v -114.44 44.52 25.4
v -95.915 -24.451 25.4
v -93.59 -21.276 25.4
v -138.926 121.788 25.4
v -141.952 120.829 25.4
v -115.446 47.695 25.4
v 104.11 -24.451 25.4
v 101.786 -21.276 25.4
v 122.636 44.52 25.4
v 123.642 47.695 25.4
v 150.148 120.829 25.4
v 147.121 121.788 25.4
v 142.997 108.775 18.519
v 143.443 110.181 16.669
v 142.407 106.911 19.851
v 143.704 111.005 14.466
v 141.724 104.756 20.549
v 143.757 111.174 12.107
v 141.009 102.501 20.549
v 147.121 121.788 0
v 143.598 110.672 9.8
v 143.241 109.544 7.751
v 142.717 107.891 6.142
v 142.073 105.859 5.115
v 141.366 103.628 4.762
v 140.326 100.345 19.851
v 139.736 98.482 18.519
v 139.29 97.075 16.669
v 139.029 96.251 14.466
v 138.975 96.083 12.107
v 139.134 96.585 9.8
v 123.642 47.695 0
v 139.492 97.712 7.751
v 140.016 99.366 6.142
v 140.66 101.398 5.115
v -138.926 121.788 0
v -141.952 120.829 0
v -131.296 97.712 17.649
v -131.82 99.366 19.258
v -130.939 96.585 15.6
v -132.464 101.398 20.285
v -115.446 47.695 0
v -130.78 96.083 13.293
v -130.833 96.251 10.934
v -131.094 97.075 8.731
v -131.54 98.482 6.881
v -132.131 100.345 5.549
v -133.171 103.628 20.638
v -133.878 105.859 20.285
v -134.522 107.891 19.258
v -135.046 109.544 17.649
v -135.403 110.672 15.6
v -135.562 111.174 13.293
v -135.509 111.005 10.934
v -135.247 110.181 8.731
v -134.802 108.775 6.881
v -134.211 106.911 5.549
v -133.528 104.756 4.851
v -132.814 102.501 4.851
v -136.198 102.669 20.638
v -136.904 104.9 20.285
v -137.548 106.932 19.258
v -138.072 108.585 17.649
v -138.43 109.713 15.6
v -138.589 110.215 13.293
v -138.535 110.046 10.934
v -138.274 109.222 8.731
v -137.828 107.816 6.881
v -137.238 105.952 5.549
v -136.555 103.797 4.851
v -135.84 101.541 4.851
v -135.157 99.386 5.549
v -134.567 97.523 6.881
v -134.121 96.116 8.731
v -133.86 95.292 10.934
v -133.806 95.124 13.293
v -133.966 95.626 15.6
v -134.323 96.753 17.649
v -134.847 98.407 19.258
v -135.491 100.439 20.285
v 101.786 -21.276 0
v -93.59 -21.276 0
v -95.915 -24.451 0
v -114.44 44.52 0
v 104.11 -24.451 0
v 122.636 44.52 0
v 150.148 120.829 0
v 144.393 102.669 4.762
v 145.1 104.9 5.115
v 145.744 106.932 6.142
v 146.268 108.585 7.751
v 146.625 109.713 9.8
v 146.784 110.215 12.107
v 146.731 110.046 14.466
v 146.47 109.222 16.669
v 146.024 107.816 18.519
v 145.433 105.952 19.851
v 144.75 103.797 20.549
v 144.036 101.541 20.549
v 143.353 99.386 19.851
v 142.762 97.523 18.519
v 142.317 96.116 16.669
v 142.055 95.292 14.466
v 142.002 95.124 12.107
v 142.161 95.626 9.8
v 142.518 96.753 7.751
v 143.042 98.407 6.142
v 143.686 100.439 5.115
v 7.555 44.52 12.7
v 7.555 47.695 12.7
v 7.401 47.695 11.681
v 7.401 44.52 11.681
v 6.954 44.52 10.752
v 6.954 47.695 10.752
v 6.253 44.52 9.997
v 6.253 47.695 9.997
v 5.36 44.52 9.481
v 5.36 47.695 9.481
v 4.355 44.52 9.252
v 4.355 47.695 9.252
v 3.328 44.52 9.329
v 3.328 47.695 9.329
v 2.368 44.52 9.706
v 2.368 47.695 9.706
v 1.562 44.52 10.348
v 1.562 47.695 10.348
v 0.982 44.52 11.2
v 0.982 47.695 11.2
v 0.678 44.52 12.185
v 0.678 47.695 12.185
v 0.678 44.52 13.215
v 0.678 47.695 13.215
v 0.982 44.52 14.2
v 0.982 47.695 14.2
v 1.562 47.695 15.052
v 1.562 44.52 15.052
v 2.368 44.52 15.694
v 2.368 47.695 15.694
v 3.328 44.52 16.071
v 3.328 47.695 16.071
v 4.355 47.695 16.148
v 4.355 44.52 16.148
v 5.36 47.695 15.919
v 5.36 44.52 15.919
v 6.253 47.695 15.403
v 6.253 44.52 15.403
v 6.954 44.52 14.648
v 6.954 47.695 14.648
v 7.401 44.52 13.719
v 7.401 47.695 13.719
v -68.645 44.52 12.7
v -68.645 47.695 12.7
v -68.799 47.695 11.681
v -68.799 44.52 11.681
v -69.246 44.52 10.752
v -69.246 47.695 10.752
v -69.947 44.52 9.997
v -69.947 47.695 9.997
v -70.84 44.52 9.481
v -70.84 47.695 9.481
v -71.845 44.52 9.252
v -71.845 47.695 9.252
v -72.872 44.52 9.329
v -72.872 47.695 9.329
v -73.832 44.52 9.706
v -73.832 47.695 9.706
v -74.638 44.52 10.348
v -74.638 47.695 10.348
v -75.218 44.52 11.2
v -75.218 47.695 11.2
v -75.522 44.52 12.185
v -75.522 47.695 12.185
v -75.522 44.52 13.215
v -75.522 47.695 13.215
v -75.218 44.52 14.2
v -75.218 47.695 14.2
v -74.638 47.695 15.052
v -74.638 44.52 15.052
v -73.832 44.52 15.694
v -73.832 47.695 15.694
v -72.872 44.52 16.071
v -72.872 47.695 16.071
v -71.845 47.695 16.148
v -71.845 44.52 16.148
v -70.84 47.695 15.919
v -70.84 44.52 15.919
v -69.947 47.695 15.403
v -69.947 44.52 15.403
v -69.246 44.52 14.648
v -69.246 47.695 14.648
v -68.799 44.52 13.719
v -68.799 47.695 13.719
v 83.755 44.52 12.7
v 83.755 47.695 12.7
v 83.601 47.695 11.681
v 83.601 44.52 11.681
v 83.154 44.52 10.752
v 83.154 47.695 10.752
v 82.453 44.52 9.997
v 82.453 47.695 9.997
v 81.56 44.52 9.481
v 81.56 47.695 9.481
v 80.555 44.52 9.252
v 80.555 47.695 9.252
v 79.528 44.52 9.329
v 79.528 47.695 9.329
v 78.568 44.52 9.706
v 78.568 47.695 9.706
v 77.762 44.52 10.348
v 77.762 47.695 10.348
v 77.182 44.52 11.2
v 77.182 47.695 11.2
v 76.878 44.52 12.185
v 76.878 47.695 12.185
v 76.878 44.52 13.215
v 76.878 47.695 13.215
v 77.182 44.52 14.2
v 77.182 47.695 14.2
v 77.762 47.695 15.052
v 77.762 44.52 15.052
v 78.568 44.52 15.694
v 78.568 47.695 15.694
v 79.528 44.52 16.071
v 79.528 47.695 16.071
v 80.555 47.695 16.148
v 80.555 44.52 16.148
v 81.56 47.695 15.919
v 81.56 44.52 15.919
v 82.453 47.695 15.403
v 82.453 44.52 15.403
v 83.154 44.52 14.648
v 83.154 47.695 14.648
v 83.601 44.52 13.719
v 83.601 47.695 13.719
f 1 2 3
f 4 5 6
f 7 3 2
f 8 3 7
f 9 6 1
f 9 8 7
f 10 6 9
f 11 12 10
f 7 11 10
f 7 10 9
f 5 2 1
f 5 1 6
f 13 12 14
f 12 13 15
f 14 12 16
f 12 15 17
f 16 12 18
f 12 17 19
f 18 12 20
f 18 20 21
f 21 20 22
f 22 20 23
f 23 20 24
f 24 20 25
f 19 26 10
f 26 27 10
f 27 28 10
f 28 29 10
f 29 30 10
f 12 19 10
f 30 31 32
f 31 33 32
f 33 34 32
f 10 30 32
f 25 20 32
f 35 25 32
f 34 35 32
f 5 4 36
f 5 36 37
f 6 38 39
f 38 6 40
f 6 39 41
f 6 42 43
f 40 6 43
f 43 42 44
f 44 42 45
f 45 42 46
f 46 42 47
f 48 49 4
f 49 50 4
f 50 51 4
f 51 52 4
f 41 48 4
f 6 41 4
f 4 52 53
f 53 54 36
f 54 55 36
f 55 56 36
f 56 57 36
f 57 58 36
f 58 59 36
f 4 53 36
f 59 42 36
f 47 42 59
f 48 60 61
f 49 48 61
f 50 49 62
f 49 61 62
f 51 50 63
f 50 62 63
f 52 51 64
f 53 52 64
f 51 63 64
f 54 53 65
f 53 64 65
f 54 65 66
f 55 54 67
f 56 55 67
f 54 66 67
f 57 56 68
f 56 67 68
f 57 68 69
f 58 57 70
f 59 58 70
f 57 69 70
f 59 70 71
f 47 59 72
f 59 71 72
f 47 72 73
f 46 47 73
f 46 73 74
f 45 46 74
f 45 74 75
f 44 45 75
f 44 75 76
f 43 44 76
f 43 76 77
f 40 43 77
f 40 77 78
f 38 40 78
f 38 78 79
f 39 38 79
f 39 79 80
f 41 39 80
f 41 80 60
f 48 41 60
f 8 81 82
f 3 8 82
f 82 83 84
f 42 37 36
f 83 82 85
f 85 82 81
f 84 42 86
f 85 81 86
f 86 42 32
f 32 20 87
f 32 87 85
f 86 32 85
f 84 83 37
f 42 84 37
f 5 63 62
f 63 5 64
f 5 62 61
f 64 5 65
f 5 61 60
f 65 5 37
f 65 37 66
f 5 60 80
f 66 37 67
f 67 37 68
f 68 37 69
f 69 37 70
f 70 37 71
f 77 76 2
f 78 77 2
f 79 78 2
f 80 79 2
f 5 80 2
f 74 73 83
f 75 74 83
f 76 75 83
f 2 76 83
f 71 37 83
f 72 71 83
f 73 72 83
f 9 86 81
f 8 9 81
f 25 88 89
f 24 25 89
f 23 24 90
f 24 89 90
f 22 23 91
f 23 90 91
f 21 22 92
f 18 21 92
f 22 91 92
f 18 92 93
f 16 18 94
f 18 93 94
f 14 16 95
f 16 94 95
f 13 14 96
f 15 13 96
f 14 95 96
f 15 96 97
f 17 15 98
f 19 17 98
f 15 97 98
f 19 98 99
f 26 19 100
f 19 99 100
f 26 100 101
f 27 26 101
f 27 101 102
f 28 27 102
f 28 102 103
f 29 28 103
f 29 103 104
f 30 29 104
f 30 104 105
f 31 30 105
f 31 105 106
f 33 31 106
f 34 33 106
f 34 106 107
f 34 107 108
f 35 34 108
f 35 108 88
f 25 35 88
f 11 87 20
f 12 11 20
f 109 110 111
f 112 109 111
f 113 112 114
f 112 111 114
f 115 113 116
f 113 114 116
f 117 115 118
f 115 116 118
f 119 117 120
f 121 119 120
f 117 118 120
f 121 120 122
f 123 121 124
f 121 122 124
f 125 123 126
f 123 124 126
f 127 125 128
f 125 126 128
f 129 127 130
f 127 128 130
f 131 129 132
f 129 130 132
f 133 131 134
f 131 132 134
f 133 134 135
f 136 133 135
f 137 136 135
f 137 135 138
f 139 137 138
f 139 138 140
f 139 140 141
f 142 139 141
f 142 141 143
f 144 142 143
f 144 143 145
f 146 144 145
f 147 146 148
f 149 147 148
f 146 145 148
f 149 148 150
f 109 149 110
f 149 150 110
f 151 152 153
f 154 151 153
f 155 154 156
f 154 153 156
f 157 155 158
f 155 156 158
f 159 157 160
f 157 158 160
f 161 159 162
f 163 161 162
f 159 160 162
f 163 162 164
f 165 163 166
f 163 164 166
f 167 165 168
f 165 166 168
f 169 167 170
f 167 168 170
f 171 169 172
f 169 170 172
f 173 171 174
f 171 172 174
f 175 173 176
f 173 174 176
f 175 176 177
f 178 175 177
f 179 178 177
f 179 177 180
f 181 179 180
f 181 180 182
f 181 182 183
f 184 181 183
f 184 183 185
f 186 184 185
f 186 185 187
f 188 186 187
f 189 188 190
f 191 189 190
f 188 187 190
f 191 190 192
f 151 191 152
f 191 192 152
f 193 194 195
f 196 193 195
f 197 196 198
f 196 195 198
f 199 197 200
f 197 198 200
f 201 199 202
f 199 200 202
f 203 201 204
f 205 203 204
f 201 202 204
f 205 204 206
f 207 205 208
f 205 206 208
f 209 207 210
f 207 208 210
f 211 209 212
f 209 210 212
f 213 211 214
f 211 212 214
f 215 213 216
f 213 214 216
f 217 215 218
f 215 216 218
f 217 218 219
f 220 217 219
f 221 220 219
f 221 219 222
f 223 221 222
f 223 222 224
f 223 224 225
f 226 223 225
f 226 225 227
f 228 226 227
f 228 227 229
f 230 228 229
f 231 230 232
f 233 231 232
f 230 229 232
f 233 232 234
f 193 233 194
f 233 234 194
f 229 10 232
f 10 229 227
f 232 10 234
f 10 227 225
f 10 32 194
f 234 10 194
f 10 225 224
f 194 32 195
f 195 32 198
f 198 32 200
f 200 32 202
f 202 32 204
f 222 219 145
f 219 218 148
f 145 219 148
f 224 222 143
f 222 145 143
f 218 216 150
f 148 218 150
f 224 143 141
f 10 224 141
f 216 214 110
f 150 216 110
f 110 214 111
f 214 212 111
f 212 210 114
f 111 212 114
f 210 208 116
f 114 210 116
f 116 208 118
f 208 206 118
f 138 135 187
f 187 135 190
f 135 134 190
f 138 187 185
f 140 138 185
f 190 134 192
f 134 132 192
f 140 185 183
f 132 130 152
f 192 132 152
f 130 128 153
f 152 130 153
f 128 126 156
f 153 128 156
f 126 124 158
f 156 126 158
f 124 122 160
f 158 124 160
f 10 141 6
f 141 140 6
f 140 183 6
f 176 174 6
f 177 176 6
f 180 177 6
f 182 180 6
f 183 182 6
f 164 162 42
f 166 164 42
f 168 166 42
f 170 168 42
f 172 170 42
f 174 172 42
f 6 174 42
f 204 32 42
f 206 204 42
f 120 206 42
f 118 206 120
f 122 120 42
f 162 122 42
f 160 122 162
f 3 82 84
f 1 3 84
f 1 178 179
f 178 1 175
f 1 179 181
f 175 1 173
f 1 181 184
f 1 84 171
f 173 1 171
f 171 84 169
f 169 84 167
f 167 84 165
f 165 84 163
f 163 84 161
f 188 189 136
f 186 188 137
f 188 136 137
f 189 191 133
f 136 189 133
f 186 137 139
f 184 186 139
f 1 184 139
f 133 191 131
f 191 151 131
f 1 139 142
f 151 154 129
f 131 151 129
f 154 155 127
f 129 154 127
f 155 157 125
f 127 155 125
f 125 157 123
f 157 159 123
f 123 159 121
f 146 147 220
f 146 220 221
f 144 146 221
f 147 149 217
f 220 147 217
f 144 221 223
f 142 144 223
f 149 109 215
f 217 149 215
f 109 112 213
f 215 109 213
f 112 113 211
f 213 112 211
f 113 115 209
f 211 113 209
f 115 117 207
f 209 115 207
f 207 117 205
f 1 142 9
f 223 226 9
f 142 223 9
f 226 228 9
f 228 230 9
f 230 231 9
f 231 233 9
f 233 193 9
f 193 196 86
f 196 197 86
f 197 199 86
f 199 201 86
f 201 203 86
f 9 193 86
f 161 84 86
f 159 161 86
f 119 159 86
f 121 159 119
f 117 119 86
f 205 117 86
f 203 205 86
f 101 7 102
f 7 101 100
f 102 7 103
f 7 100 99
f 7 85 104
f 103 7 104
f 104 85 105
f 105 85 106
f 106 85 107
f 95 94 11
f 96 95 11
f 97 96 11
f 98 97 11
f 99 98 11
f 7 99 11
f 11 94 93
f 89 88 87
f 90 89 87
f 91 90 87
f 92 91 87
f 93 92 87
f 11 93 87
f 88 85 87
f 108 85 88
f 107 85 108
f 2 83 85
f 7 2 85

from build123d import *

# Parameters (mm, degrees)
BOSS_EXTRUDE1_DEPTH = 25.4
SKETCH2_R           = 7.9375
CUT_EXTRUDE1_DEPTH  = 25.4
SKETCH3_R           = 7.9375
CUT_EXTRUDE2_DEPTH  = 25.4
BOSS_EXTRUDE2_DEPTH = 25.4
SKETCH6_R           = 3.457615734
CUT_EXTRUDE4_DEPTH  = 3.175


with BuildPart() as part:
    # Sketch1 → Boss-Extrude1 (new body)
    with BuildSketch(Plane.XY):
        Polygon((-95.914729745, -24.450906393), (104.110270255, -24.450906393), (150.147770255, 120.829197523), (147.121101424, 121.788312106), (101.785788593, -21.275906393), (-93.590248082, -21.275906393), (-138.925560913, 121.788312106), (-141.952229745, 120.829197523), align=None)
    extrude(amount=BOSS_EXTRUDE1_DEPTH)

    # Sketch2 → Cut-Extrude1 (cut)
    with BuildSketch(Plane(origin=(-94.203233113, -29.851860148, 0), x_dir=(0, 0, 1), z_dir=(-0.953281522, -0.302083333, 0))):
        with Locations((12.7, 139.015644022)):
            Circle(SKETCH2_R)
    extrude(amount=-CUT_EXTRUDE1_DEPTH, mode=Mode.SUBTRACT)

    # Sketch3 → Cut-Extrude2 (cut)
    with BuildSketch(Plane(origin=(101.650894981, -32.211933717, 0), x_dir=(0, 0, -1), z_dir=(0.953281522, -0.302083333, 0))):
        with Locations((-12.7, 141.491380218)):
            Circle(SKETCH3_R)
    extrude(amount=-CUT_EXTRUDE2_DEPTH, mode=Mode.SUBTRACT)

    # Sketch5 → Boss-Extrude2 (add)
    with BuildSketch(Plane(origin=(0, 0, 0), x_dir=(-1, 0, 0), z_dir=(0, 0, -1))):
        Polygon((-123.641976424, 47.695459109), (115.446435913, 47.695459109), (114.440316985, 44.520459109), (-122.635857495, 44.520459109), align=None)
    extrude(amount=-BOSS_EXTRUDE2_DEPTH)

    # Sketch6 → Cut-Extrude4 (cut)
    with BuildSketch(Plane(origin=(0, 47.695459109, 0), x_dir=(1, 0, 0), z_dir=(0, 1, 0))):
        with Locations((-72.103023576, -12.7)):
            Circle(SKETCH6_R)
        with Locations((4.096976424, -12.7)):
            Circle(SKETCH6_R)
        with Locations((80.296976424, -12.7)):
            Circle(SKETCH6_R)
    extrude(amount=-CUT_EXTRUDE4_DEPTH, mode=Mode.SUBTRACT)


solid = part.part
